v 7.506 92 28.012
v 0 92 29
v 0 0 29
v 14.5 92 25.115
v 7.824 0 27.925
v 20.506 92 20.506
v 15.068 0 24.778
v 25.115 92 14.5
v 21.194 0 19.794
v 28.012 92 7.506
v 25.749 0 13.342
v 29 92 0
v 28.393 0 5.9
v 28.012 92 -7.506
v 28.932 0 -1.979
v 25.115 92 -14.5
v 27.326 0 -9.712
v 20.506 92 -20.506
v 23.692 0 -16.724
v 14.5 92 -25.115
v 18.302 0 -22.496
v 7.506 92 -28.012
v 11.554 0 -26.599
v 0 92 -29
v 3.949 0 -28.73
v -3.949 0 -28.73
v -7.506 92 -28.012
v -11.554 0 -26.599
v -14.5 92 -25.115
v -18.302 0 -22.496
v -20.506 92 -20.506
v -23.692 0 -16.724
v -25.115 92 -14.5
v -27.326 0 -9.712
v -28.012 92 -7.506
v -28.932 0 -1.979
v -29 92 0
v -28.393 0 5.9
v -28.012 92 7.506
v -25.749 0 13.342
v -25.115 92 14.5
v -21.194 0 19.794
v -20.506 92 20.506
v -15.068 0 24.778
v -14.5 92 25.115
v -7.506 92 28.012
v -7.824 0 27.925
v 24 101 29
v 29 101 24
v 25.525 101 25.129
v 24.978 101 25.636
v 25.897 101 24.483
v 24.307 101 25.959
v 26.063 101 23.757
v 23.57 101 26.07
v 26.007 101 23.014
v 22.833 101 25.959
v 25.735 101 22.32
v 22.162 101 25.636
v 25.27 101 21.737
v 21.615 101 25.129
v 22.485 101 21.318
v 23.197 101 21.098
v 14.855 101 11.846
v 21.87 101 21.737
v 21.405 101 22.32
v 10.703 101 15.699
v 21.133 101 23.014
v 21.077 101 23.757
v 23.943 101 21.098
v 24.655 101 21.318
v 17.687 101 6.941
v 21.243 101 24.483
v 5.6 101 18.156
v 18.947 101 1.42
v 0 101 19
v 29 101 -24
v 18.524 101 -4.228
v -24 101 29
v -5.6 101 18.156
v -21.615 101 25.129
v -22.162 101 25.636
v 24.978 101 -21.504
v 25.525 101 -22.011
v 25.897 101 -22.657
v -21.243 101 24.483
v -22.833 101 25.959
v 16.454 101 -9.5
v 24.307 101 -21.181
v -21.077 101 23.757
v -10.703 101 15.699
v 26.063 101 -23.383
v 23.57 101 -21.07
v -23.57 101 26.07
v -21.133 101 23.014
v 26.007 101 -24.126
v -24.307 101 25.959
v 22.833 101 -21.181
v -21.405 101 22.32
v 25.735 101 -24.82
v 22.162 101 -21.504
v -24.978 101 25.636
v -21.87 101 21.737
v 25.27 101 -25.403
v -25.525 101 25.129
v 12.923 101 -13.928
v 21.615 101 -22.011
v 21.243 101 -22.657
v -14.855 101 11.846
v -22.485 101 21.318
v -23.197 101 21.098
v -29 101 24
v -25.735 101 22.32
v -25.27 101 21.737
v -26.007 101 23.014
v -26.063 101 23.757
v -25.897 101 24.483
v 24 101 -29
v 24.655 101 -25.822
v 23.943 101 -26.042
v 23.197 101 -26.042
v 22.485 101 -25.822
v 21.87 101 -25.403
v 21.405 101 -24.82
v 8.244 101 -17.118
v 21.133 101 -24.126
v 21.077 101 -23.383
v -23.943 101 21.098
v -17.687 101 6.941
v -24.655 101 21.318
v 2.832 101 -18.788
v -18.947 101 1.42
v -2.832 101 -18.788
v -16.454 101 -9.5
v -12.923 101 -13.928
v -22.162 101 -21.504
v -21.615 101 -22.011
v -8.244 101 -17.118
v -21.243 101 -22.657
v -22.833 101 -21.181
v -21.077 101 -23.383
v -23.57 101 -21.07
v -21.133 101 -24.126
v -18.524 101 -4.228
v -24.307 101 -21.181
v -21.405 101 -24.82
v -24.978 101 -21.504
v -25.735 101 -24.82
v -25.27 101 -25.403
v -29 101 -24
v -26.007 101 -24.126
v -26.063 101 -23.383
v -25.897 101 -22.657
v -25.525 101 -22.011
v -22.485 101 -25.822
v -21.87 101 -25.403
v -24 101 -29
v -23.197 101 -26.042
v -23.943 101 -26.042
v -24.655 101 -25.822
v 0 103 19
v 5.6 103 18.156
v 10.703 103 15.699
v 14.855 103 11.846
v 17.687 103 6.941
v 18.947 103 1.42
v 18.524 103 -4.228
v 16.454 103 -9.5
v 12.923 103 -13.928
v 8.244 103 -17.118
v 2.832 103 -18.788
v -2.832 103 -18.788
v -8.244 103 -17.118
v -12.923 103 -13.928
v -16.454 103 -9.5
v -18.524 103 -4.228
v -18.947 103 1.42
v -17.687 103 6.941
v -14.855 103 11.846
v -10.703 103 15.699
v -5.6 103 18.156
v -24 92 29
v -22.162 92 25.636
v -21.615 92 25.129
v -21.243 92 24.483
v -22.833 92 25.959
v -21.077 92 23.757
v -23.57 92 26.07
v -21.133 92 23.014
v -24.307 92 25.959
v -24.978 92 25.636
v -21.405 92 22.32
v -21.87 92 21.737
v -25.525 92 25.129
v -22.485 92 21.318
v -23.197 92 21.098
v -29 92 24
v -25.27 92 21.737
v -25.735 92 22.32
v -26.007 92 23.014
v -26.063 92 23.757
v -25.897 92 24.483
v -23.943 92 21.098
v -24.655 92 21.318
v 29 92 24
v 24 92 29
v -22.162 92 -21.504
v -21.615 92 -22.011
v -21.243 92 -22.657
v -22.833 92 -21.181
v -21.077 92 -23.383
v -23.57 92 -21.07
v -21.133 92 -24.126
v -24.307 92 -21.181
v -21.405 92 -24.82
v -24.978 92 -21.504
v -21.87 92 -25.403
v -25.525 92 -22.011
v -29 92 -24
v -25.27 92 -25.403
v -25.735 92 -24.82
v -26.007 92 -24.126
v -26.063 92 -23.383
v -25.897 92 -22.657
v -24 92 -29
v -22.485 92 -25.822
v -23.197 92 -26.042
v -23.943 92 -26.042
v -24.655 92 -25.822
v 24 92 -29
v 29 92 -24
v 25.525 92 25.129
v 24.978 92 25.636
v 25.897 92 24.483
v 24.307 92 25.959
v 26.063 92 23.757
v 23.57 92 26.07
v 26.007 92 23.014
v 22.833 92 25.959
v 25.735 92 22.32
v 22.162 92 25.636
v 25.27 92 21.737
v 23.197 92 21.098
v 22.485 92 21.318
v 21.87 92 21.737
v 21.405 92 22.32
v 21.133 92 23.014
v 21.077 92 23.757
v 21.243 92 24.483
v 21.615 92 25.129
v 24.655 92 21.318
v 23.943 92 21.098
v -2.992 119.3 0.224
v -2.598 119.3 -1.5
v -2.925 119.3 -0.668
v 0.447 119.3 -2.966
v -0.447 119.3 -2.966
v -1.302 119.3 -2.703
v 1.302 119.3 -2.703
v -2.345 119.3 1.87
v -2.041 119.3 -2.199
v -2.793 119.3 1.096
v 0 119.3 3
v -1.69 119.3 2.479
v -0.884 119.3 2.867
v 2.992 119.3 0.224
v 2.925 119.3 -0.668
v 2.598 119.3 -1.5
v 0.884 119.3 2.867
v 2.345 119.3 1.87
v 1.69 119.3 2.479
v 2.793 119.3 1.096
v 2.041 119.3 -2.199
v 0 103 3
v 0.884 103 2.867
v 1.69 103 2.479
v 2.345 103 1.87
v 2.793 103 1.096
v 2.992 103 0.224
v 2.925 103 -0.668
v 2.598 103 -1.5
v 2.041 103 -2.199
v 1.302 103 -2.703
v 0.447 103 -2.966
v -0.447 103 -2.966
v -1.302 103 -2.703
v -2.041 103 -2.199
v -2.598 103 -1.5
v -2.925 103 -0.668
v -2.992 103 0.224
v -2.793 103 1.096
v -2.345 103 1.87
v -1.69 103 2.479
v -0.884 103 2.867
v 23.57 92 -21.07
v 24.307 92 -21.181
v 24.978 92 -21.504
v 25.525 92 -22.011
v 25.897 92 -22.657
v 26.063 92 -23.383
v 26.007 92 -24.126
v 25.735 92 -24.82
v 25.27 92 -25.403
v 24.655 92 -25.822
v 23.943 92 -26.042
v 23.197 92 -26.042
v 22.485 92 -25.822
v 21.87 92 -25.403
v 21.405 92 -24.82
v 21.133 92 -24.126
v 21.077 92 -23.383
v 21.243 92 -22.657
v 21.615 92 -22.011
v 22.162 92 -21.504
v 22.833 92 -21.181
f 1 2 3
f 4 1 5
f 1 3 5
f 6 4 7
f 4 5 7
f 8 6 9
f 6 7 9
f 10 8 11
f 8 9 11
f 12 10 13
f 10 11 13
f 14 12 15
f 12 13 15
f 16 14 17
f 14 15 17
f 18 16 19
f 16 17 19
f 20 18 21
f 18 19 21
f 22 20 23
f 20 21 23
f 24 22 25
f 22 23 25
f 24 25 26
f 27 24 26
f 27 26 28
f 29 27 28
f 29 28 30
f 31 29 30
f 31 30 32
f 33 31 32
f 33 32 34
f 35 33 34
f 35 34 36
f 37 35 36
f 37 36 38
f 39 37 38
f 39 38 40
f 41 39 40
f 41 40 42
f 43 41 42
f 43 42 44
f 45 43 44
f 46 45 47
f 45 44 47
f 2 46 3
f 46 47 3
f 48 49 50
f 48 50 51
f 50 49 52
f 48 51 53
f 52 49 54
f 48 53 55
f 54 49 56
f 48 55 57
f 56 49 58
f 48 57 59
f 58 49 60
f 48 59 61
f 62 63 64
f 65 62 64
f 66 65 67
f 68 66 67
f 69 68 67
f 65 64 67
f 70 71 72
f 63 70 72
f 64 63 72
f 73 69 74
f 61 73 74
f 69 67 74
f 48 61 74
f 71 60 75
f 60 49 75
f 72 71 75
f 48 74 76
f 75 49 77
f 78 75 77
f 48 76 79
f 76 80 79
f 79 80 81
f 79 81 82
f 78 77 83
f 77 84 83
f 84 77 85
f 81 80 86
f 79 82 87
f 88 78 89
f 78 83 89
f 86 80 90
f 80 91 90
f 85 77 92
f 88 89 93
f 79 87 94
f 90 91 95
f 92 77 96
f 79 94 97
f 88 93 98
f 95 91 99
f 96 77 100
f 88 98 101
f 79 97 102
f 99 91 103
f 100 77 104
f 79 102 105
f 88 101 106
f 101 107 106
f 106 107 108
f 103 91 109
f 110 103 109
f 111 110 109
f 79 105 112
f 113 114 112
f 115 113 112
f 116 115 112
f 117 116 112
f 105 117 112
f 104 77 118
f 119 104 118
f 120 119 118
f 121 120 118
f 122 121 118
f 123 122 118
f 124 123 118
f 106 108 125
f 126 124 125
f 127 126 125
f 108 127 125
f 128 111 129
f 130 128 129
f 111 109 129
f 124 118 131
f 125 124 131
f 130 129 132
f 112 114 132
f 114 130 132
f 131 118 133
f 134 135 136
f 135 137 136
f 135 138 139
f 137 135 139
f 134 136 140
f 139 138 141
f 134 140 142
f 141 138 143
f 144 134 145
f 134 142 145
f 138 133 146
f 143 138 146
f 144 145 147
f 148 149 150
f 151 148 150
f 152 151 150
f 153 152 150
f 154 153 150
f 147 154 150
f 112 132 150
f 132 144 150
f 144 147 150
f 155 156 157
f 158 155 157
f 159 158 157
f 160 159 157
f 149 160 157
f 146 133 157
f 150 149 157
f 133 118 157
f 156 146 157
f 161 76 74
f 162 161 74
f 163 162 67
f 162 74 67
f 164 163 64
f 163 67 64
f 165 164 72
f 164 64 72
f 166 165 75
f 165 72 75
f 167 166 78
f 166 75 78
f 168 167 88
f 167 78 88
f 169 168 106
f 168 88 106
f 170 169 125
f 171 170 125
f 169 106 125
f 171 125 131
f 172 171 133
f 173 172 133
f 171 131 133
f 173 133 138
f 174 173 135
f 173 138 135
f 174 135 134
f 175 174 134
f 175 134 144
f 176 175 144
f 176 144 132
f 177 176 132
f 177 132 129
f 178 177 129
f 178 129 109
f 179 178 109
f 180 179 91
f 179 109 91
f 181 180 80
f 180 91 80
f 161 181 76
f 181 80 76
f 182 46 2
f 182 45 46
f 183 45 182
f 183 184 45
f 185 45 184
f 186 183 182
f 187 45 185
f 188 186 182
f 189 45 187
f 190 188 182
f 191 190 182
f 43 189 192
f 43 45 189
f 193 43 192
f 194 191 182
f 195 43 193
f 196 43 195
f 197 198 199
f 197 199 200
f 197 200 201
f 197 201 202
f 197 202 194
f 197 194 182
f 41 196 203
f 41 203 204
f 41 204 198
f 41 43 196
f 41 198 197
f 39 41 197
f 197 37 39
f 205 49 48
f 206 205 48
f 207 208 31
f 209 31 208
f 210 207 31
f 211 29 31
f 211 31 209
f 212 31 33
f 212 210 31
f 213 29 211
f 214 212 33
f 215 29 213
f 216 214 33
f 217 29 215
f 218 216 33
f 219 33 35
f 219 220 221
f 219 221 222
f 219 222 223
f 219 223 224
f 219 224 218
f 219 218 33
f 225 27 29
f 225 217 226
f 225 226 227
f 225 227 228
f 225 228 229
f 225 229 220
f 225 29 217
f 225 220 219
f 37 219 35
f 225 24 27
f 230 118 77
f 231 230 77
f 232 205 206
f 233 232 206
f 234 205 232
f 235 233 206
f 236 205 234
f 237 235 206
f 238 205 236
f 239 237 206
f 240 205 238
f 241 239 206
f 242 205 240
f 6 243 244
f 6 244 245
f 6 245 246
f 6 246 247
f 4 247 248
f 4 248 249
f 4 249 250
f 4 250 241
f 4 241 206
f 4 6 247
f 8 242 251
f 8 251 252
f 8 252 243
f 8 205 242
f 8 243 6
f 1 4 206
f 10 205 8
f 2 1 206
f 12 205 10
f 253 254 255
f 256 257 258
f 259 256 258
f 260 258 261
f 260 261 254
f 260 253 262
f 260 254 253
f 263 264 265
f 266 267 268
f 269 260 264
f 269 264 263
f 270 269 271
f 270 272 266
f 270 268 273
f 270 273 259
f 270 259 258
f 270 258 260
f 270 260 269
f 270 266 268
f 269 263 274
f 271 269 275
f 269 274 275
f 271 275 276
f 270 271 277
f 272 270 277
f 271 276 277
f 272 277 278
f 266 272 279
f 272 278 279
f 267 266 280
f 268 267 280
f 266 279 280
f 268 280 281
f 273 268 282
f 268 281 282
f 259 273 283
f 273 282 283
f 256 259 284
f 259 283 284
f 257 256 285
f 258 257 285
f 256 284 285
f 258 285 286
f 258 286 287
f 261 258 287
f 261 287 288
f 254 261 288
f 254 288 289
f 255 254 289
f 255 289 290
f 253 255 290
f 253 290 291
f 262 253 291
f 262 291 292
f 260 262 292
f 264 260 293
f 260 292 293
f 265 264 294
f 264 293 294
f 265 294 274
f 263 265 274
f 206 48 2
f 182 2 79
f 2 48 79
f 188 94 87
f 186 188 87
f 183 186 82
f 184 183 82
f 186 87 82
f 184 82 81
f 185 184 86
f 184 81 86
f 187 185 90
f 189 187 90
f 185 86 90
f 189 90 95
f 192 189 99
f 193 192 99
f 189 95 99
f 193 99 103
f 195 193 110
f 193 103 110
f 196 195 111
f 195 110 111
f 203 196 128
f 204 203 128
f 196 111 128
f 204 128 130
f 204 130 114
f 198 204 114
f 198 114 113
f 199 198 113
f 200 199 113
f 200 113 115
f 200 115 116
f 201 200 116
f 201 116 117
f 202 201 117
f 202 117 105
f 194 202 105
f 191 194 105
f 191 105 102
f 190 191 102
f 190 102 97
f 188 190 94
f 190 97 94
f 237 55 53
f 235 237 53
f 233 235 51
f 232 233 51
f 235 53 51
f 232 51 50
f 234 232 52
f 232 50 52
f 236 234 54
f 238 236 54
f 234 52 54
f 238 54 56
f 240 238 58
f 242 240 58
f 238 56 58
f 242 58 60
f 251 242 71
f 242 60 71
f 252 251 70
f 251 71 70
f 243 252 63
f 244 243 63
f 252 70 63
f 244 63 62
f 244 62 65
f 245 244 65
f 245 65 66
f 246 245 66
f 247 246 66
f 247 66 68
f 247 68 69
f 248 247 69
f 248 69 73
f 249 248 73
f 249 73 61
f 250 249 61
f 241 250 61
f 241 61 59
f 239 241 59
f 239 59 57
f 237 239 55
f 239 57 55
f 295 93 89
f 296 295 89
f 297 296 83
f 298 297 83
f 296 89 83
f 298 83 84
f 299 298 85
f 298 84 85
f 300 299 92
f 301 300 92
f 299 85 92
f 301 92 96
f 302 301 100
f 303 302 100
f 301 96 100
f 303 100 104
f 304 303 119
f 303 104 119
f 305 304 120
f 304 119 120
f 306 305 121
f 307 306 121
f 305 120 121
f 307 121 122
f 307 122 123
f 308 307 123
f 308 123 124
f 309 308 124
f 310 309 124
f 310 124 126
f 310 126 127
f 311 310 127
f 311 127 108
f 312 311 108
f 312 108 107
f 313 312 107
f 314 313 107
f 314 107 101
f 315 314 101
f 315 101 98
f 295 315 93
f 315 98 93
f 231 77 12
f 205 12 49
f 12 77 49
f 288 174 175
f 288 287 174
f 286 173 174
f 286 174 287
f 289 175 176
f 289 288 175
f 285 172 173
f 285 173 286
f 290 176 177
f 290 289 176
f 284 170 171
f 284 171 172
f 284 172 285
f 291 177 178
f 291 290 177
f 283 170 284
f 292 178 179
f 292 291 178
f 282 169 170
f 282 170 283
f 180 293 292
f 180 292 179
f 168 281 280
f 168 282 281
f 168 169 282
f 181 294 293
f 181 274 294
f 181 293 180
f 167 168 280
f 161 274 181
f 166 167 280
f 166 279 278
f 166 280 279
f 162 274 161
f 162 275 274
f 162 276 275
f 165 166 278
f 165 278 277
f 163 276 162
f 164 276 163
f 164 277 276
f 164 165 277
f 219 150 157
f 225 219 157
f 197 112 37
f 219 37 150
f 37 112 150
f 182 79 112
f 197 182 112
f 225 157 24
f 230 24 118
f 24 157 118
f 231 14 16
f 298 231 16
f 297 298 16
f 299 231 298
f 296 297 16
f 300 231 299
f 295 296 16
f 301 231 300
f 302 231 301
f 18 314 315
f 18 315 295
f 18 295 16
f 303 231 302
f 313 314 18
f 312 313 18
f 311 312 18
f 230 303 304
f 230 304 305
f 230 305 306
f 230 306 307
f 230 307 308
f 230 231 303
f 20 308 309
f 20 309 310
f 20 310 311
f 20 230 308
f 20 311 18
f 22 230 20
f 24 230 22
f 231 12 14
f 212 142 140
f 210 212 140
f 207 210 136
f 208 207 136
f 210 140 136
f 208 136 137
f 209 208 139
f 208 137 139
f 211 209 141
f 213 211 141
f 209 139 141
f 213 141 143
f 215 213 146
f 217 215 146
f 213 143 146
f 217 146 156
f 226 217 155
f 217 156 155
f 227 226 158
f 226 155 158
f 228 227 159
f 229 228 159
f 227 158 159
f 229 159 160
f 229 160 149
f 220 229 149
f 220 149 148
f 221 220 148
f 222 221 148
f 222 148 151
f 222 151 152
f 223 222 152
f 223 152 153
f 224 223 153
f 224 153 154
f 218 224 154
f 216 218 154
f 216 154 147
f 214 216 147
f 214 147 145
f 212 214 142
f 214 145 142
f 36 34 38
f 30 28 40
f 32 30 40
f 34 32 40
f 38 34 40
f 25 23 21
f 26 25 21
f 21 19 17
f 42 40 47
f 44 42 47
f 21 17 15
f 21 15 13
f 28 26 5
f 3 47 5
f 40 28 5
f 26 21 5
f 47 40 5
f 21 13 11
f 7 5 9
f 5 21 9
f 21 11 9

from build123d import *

# Parameters (mm, degrees)
SKETCH2_R           = 29
BOSS_EXTRUDE1_DEPTH = 101
SKETCH3_R           = 2.5
BOSS_EXTRUDE2_DEPTH = 9
SKETCH4_R           = 19
BOSS_EXTRUDE3_DEPTH = 2
SKETCH5_R           = 3
BOSS_EXTRUDE4_DEPTH = 16.3


with BuildPart() as part:
    # Sketch2 → Boss-Extrude1 (new body)
    with BuildSketch(Plane(origin=(0, 0, 0), x_dir=(1, 0, 0), z_dir=(0, 1, 0))):
        with Locations(Location((0, 0, 0), (0, 0, 270))):
            Circle(SKETCH2_R)
    extrude(amount=BOSS_EXTRUDE1_DEPTH)

    # Sketch3 → Boss-Extrude2 (add)
    with BuildSketch(Plane(origin=(0, 101, 0), x_dir=(1, 0, 0), z_dir=(0, 1, 0))):
        Polygon((-29, 24), (-24, 29), (24, 29), (29, 24), (29, -24), (24, -29), (-24, -29), (-29, -24), align=None)
        with Locations(Location((-23.57, 23.57, 0), (0, 0, 270))):
            Circle(SKETCH3_R, mode=Mode.SUBTRACT)
        with Locations(Location((23.57, 23.57, 0), (0, 0, 270))):
            Circle(SKETCH3_R, mode=Mode.SUBTRACT)
        with Locations(Location((23.57, -23.57, 0), (0, 0, 270))):
            Circle(SKETCH3_R, mode=Mode.SUBTRACT)
        with Locations(Location((-23.57, -23.57, 0), (0, 0, 270))):
            Circle(SKETCH3_R, mode=Mode.SUBTRACT)
    extrude(amount=-BOSS_EXTRUDE2_DEPTH)

    # Sketch4 → Boss-Extrude3 (add)
    with BuildSketch(Plane(origin=(0, 101, 0), x_dir=(1, 0, 0), z_dir=(0, 1, 0))):
        with Locations(Location((0, 0, 0), (0, 0, 270))):
            Circle(SKETCH4_R)
    extrude(amount=BOSS_EXTRUDE3_DEPTH)

    # Sketch5 → Boss-Extrude4 (add)
    with BuildSketch(Plane(origin=(0, 103, 0), x_dir=(1, 0, 0), z_dir=(0, 1, 0))):
        with Locations(Location((0, 0, 0), (0, 0, 270))):
            Circle(SKETCH5_R)
    extrude(amount=BOSS_EXTRUDE4_DEPTH)


solid = part.part
